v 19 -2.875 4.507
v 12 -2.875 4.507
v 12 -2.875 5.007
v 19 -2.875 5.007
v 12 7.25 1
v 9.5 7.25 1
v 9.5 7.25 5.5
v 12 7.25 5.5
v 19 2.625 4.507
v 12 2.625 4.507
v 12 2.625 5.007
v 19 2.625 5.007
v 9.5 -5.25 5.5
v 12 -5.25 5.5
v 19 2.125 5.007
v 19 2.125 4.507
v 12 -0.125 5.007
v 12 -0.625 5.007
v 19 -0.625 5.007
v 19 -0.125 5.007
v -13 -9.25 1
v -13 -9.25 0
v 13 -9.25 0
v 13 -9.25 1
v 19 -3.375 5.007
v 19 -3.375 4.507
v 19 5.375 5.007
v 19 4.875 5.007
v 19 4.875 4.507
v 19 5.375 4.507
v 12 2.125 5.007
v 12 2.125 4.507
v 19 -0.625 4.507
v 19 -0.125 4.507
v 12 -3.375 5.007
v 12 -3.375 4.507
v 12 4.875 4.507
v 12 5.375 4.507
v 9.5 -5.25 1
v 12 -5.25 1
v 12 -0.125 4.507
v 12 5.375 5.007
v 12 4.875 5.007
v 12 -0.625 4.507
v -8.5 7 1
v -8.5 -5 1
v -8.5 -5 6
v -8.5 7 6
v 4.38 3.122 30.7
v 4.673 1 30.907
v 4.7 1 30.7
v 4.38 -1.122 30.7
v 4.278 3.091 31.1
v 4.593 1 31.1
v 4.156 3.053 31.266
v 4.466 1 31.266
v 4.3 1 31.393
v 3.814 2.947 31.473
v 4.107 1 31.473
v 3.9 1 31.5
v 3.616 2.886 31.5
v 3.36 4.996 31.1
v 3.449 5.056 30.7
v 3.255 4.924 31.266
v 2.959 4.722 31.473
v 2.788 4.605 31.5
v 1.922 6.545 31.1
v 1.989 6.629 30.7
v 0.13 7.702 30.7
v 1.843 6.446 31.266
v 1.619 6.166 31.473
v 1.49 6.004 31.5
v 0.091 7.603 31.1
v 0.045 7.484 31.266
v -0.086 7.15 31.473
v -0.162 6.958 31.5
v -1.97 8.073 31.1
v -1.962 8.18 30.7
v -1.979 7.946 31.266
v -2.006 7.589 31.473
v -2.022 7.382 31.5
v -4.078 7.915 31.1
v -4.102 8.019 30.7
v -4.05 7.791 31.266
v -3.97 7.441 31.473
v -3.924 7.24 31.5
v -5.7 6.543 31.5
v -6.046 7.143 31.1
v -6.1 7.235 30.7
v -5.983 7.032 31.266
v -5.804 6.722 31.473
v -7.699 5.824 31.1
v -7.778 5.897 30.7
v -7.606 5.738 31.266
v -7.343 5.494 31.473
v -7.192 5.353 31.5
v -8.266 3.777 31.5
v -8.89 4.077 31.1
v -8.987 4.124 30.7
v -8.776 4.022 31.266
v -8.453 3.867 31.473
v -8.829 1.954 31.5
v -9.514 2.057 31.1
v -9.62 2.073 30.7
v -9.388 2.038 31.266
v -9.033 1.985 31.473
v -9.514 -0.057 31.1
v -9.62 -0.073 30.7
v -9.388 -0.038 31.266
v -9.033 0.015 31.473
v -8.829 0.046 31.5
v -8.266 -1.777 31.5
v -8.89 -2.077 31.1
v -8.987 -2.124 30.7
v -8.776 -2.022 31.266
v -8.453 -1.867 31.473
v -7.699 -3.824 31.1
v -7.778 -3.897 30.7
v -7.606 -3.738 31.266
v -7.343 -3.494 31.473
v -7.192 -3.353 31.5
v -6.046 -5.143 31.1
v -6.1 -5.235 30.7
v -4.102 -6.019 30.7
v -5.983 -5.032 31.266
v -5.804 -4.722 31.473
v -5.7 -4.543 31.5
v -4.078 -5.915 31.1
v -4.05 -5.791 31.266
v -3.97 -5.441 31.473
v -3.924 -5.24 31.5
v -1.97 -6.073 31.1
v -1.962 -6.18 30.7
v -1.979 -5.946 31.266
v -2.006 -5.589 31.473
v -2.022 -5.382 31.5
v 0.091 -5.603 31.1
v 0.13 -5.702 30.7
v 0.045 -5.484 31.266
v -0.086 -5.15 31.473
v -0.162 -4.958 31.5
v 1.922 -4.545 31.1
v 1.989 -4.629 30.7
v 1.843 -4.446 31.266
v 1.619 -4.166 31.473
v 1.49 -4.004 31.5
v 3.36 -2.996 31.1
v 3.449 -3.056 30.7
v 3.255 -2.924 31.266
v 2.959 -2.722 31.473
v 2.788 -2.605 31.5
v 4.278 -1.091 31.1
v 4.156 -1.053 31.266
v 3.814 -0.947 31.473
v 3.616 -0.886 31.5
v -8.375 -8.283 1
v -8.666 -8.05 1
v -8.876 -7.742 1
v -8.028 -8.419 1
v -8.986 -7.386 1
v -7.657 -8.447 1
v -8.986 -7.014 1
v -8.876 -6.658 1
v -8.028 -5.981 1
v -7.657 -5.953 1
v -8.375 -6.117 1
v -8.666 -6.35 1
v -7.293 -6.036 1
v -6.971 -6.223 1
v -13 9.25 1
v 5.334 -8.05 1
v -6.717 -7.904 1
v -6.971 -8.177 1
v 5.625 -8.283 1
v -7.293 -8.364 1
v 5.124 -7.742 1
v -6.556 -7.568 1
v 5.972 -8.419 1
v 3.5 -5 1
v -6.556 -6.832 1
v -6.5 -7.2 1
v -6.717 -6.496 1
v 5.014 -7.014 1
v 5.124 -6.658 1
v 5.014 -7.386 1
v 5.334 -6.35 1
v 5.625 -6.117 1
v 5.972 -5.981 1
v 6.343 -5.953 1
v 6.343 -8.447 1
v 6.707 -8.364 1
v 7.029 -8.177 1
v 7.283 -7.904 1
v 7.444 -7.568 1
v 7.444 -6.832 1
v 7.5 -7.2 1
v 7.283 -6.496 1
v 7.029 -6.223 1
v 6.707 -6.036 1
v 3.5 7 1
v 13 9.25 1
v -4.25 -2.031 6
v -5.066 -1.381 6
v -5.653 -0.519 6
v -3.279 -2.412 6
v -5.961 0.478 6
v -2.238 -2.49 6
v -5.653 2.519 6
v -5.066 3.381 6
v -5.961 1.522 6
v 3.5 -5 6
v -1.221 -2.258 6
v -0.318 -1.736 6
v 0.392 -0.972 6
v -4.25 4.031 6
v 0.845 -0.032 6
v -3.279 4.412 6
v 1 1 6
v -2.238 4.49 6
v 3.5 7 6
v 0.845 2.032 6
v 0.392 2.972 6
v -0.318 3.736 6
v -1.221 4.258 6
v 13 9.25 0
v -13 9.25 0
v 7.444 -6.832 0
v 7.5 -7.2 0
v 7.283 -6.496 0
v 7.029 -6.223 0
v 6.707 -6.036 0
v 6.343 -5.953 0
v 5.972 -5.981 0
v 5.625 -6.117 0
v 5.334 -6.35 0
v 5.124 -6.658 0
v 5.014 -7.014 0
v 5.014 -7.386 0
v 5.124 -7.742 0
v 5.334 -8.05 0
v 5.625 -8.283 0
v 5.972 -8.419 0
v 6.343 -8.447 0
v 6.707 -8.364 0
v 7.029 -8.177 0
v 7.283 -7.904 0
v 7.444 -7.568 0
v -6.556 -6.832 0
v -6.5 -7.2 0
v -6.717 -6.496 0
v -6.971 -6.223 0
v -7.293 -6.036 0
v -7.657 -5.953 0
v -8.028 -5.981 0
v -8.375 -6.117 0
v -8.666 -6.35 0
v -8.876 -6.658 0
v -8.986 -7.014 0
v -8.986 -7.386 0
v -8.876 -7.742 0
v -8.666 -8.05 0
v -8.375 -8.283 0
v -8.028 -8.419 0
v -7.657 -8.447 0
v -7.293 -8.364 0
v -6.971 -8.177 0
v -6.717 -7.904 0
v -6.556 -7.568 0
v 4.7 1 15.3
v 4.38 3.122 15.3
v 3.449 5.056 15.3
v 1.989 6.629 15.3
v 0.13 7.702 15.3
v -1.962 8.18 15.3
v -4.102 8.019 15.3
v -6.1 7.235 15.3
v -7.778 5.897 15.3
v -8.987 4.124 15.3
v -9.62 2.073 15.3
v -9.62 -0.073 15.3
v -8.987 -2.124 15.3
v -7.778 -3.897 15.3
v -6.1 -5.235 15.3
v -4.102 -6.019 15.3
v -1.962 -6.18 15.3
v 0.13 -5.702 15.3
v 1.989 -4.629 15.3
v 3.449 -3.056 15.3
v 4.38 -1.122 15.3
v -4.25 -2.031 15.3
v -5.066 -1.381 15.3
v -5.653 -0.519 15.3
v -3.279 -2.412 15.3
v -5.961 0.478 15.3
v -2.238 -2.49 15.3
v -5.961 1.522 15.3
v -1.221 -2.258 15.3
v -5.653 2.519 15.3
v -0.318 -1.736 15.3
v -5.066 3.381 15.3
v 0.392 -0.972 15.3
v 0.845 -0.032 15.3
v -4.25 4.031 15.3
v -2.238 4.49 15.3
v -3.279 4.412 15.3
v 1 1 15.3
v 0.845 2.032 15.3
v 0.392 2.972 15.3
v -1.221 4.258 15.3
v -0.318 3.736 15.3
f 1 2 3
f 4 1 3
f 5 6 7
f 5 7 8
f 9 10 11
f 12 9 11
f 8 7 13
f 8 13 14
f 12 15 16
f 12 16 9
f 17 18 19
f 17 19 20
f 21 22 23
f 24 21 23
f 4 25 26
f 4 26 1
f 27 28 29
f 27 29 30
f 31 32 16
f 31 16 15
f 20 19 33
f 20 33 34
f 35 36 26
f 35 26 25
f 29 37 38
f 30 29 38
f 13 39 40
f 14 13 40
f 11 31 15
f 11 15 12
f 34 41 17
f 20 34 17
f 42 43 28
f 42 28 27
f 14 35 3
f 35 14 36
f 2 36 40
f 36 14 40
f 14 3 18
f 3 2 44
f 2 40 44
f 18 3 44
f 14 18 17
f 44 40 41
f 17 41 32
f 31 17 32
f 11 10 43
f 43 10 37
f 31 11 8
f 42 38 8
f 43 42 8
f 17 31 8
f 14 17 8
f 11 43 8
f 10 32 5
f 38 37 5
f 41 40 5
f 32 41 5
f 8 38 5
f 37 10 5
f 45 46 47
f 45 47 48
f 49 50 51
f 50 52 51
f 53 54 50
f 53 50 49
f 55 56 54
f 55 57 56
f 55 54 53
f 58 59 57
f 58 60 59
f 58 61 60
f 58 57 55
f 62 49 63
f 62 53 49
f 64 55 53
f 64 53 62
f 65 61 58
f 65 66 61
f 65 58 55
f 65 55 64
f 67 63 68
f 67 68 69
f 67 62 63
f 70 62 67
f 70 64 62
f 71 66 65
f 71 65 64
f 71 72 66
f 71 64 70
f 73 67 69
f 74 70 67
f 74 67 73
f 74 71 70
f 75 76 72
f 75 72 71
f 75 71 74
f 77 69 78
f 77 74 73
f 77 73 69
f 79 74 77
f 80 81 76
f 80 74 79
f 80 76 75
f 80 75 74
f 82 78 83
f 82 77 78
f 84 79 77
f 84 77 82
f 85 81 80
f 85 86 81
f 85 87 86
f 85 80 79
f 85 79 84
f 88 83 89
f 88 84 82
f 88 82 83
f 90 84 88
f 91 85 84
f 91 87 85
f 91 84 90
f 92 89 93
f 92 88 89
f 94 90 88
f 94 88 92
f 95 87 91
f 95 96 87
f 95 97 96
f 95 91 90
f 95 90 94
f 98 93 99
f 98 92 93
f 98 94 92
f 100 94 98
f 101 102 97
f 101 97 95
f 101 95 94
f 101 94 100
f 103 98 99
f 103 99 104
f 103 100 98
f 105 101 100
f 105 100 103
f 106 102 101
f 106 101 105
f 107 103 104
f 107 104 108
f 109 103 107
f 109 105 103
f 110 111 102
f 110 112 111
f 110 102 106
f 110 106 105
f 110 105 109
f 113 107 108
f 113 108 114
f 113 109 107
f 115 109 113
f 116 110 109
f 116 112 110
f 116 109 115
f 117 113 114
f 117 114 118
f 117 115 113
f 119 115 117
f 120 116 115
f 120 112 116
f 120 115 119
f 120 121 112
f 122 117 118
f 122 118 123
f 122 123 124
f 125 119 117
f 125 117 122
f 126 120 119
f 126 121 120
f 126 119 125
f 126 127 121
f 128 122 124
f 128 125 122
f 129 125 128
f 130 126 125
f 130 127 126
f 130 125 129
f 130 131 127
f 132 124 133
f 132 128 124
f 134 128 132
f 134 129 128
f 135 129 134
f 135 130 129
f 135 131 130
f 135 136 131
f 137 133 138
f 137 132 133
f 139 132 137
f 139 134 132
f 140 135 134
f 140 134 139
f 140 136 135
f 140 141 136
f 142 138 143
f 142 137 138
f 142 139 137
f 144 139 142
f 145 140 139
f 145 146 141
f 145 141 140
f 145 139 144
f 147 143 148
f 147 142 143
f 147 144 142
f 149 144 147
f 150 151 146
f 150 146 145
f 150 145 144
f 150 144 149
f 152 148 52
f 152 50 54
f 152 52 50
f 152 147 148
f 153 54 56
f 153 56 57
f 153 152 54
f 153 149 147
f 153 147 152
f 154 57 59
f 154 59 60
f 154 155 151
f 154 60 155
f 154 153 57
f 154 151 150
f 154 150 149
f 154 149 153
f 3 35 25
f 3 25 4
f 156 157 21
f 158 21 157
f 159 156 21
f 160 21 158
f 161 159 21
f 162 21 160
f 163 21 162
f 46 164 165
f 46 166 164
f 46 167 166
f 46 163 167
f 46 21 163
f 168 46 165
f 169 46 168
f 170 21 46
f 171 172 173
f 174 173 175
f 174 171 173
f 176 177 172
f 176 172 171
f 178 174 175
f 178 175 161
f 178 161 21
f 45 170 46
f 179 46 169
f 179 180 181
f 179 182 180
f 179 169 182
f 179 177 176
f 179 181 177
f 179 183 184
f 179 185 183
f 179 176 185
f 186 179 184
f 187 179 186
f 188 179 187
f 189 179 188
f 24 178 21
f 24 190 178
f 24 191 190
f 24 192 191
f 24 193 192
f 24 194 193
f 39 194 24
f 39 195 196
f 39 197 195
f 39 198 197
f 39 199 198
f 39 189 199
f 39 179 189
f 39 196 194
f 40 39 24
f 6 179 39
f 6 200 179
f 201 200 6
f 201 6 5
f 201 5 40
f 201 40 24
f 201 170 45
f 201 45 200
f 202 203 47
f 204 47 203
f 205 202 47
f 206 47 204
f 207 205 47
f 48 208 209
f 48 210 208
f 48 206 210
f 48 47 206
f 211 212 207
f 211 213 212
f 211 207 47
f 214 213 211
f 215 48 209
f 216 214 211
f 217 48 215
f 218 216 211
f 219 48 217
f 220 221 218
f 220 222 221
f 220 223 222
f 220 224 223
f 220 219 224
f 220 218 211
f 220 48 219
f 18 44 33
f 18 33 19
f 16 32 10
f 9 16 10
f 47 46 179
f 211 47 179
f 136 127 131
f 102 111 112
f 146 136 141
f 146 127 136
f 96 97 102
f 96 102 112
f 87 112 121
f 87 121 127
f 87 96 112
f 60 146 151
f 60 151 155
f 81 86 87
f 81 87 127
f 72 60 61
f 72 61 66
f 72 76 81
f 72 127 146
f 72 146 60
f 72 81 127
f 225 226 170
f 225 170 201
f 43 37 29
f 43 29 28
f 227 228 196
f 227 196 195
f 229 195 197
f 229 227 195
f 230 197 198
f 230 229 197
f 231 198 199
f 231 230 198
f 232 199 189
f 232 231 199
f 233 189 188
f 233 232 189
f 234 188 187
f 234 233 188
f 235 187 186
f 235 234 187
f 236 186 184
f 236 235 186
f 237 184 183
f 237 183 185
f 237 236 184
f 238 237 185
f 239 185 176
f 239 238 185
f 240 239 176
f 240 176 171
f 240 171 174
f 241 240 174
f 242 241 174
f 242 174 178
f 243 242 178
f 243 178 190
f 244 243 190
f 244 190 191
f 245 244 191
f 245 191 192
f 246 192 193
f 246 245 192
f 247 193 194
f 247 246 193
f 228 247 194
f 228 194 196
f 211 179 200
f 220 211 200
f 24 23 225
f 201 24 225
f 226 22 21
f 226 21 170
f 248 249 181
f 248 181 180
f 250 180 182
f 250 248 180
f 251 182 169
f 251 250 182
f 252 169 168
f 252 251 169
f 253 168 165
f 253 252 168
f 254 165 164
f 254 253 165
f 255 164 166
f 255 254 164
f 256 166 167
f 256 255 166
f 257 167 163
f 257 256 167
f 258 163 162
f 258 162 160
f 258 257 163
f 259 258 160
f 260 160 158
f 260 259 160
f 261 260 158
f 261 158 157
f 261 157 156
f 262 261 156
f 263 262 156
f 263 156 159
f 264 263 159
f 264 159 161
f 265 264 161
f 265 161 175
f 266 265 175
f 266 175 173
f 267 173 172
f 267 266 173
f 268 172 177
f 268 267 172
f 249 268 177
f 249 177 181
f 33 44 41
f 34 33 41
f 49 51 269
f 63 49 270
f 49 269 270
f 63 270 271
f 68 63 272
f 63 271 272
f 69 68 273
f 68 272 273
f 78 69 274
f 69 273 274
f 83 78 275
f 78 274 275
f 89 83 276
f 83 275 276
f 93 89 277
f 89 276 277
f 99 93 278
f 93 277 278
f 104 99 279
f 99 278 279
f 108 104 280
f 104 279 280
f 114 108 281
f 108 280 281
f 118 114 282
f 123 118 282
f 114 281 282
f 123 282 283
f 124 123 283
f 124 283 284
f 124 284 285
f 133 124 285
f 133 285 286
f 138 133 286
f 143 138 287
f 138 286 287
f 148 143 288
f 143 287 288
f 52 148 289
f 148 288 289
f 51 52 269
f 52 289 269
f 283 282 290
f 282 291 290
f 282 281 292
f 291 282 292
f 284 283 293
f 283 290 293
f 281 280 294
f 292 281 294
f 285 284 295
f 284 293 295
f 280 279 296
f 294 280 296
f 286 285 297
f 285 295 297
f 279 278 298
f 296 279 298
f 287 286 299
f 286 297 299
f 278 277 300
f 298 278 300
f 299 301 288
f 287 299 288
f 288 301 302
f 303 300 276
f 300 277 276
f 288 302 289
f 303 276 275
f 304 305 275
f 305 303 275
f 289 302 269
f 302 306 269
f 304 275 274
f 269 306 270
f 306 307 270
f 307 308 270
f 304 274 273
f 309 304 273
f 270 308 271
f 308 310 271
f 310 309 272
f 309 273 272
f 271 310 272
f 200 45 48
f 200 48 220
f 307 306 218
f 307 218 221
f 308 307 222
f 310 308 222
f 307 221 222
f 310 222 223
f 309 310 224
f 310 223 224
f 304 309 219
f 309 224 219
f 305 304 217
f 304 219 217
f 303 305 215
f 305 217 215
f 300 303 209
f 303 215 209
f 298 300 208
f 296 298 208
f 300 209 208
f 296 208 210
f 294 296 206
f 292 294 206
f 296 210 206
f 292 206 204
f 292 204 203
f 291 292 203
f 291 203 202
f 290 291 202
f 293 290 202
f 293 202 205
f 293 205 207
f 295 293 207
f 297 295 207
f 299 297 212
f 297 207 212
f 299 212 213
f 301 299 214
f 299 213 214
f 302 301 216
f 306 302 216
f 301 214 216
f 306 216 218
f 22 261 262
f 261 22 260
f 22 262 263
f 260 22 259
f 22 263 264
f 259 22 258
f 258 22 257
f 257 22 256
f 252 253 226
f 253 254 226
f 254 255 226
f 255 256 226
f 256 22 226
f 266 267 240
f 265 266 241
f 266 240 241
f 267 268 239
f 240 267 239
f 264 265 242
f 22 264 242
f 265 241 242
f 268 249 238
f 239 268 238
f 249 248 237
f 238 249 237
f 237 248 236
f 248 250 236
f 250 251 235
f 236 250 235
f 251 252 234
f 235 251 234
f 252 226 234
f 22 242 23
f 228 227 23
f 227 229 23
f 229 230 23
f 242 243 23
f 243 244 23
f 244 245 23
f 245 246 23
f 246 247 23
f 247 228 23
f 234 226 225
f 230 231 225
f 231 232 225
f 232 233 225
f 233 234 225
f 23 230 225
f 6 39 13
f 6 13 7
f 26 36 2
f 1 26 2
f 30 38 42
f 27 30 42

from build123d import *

# Parameters (mm, degrees)
F0_W      = 26
F0_H      = 18.5
F0_R      = 1.25
F1_DEPTH  = 1
F2_W      = 12
F2_H      = 12
F3_DEPTH  = 5
F4_R      = 3.5
F5_DEPTH  = 9.3
F6_R      = 7.2
F7_DEPTH  = 16.2
F8_R      = 0.8
F9_W      = 2.5
F9_H      = 12.5
F10_DEPTH = 4.5
F11_W     = 0.5
F11_H     = 0.5
F12_DEPTH = 7


with BuildPart() as f1:
    # F0 (on Top) → F1 (new body)
    with BuildSketch(Plane.XY):
        Rectangle(F0_W, F0_H)
        with Locations((-7.75, -7.2)):
            Circle(F0_R, mode=Mode.SUBTRACT)
        with Locations((6.25, -7.2)):
            Circle(F0_R, mode=Mode.SUBTRACT)
    extrude(amount=F1_DEPTH)

    # F2 (on face) → F3 (join)
    with BuildSketch(Plane.XY.offset(1)):
        with Locations((-2.5, 1)):
            Rectangle(F2_W, F2_H)
    extrude(amount=F3_DEPTH)

    # F4 (on face) → F5 (join)
    with BuildSketch(Plane.XY.offset(6)):
        with Locations((-2.5, 1)):
            Circle(F4_R)
    extrude(amount=F5_DEPTH)

    # F6 (on face) → F7 (join)
    with BuildSketch(Plane.XY.offset(15.3)):
        with Locations((-2.5, 1)):
            Circle(F6_R)
    extrude(amount=F7_DEPTH)

    # F8
    f8_edges = [f1.edges().sort_by_distance(p)[0] for p in [
        (-9.7, 1, 31.5),
    ]]
    fillet(f8_edges, radius=F8_R)

    # F9 (on face) → F10 (join)
    with BuildSketch(Plane.XY.offset(1)):
        with Locations((10.75, 1)):
            Rectangle(F9_W, F9_H)
    extrude(amount=F10_DEPTH)

    # F11 (on face) → F12 (join)
    with BuildSketch(Plane.YZ.offset(12)):
        with Locations((-3.125, 4.757234)):
            Rectangle(F11_W, F11_H)
        with Locations((-0.375, 4.757234)):
            Rectangle(F11_W, F11_H)
        with Locations((2.375, 4.757234)):
            Rectangle(F11_W, F11_H)
        with Locations((5.125, 4.757234)):
            Rectangle(F11_W, F11_H)
    extrude(amount=F12_DEPTH)


solid = f1.part
